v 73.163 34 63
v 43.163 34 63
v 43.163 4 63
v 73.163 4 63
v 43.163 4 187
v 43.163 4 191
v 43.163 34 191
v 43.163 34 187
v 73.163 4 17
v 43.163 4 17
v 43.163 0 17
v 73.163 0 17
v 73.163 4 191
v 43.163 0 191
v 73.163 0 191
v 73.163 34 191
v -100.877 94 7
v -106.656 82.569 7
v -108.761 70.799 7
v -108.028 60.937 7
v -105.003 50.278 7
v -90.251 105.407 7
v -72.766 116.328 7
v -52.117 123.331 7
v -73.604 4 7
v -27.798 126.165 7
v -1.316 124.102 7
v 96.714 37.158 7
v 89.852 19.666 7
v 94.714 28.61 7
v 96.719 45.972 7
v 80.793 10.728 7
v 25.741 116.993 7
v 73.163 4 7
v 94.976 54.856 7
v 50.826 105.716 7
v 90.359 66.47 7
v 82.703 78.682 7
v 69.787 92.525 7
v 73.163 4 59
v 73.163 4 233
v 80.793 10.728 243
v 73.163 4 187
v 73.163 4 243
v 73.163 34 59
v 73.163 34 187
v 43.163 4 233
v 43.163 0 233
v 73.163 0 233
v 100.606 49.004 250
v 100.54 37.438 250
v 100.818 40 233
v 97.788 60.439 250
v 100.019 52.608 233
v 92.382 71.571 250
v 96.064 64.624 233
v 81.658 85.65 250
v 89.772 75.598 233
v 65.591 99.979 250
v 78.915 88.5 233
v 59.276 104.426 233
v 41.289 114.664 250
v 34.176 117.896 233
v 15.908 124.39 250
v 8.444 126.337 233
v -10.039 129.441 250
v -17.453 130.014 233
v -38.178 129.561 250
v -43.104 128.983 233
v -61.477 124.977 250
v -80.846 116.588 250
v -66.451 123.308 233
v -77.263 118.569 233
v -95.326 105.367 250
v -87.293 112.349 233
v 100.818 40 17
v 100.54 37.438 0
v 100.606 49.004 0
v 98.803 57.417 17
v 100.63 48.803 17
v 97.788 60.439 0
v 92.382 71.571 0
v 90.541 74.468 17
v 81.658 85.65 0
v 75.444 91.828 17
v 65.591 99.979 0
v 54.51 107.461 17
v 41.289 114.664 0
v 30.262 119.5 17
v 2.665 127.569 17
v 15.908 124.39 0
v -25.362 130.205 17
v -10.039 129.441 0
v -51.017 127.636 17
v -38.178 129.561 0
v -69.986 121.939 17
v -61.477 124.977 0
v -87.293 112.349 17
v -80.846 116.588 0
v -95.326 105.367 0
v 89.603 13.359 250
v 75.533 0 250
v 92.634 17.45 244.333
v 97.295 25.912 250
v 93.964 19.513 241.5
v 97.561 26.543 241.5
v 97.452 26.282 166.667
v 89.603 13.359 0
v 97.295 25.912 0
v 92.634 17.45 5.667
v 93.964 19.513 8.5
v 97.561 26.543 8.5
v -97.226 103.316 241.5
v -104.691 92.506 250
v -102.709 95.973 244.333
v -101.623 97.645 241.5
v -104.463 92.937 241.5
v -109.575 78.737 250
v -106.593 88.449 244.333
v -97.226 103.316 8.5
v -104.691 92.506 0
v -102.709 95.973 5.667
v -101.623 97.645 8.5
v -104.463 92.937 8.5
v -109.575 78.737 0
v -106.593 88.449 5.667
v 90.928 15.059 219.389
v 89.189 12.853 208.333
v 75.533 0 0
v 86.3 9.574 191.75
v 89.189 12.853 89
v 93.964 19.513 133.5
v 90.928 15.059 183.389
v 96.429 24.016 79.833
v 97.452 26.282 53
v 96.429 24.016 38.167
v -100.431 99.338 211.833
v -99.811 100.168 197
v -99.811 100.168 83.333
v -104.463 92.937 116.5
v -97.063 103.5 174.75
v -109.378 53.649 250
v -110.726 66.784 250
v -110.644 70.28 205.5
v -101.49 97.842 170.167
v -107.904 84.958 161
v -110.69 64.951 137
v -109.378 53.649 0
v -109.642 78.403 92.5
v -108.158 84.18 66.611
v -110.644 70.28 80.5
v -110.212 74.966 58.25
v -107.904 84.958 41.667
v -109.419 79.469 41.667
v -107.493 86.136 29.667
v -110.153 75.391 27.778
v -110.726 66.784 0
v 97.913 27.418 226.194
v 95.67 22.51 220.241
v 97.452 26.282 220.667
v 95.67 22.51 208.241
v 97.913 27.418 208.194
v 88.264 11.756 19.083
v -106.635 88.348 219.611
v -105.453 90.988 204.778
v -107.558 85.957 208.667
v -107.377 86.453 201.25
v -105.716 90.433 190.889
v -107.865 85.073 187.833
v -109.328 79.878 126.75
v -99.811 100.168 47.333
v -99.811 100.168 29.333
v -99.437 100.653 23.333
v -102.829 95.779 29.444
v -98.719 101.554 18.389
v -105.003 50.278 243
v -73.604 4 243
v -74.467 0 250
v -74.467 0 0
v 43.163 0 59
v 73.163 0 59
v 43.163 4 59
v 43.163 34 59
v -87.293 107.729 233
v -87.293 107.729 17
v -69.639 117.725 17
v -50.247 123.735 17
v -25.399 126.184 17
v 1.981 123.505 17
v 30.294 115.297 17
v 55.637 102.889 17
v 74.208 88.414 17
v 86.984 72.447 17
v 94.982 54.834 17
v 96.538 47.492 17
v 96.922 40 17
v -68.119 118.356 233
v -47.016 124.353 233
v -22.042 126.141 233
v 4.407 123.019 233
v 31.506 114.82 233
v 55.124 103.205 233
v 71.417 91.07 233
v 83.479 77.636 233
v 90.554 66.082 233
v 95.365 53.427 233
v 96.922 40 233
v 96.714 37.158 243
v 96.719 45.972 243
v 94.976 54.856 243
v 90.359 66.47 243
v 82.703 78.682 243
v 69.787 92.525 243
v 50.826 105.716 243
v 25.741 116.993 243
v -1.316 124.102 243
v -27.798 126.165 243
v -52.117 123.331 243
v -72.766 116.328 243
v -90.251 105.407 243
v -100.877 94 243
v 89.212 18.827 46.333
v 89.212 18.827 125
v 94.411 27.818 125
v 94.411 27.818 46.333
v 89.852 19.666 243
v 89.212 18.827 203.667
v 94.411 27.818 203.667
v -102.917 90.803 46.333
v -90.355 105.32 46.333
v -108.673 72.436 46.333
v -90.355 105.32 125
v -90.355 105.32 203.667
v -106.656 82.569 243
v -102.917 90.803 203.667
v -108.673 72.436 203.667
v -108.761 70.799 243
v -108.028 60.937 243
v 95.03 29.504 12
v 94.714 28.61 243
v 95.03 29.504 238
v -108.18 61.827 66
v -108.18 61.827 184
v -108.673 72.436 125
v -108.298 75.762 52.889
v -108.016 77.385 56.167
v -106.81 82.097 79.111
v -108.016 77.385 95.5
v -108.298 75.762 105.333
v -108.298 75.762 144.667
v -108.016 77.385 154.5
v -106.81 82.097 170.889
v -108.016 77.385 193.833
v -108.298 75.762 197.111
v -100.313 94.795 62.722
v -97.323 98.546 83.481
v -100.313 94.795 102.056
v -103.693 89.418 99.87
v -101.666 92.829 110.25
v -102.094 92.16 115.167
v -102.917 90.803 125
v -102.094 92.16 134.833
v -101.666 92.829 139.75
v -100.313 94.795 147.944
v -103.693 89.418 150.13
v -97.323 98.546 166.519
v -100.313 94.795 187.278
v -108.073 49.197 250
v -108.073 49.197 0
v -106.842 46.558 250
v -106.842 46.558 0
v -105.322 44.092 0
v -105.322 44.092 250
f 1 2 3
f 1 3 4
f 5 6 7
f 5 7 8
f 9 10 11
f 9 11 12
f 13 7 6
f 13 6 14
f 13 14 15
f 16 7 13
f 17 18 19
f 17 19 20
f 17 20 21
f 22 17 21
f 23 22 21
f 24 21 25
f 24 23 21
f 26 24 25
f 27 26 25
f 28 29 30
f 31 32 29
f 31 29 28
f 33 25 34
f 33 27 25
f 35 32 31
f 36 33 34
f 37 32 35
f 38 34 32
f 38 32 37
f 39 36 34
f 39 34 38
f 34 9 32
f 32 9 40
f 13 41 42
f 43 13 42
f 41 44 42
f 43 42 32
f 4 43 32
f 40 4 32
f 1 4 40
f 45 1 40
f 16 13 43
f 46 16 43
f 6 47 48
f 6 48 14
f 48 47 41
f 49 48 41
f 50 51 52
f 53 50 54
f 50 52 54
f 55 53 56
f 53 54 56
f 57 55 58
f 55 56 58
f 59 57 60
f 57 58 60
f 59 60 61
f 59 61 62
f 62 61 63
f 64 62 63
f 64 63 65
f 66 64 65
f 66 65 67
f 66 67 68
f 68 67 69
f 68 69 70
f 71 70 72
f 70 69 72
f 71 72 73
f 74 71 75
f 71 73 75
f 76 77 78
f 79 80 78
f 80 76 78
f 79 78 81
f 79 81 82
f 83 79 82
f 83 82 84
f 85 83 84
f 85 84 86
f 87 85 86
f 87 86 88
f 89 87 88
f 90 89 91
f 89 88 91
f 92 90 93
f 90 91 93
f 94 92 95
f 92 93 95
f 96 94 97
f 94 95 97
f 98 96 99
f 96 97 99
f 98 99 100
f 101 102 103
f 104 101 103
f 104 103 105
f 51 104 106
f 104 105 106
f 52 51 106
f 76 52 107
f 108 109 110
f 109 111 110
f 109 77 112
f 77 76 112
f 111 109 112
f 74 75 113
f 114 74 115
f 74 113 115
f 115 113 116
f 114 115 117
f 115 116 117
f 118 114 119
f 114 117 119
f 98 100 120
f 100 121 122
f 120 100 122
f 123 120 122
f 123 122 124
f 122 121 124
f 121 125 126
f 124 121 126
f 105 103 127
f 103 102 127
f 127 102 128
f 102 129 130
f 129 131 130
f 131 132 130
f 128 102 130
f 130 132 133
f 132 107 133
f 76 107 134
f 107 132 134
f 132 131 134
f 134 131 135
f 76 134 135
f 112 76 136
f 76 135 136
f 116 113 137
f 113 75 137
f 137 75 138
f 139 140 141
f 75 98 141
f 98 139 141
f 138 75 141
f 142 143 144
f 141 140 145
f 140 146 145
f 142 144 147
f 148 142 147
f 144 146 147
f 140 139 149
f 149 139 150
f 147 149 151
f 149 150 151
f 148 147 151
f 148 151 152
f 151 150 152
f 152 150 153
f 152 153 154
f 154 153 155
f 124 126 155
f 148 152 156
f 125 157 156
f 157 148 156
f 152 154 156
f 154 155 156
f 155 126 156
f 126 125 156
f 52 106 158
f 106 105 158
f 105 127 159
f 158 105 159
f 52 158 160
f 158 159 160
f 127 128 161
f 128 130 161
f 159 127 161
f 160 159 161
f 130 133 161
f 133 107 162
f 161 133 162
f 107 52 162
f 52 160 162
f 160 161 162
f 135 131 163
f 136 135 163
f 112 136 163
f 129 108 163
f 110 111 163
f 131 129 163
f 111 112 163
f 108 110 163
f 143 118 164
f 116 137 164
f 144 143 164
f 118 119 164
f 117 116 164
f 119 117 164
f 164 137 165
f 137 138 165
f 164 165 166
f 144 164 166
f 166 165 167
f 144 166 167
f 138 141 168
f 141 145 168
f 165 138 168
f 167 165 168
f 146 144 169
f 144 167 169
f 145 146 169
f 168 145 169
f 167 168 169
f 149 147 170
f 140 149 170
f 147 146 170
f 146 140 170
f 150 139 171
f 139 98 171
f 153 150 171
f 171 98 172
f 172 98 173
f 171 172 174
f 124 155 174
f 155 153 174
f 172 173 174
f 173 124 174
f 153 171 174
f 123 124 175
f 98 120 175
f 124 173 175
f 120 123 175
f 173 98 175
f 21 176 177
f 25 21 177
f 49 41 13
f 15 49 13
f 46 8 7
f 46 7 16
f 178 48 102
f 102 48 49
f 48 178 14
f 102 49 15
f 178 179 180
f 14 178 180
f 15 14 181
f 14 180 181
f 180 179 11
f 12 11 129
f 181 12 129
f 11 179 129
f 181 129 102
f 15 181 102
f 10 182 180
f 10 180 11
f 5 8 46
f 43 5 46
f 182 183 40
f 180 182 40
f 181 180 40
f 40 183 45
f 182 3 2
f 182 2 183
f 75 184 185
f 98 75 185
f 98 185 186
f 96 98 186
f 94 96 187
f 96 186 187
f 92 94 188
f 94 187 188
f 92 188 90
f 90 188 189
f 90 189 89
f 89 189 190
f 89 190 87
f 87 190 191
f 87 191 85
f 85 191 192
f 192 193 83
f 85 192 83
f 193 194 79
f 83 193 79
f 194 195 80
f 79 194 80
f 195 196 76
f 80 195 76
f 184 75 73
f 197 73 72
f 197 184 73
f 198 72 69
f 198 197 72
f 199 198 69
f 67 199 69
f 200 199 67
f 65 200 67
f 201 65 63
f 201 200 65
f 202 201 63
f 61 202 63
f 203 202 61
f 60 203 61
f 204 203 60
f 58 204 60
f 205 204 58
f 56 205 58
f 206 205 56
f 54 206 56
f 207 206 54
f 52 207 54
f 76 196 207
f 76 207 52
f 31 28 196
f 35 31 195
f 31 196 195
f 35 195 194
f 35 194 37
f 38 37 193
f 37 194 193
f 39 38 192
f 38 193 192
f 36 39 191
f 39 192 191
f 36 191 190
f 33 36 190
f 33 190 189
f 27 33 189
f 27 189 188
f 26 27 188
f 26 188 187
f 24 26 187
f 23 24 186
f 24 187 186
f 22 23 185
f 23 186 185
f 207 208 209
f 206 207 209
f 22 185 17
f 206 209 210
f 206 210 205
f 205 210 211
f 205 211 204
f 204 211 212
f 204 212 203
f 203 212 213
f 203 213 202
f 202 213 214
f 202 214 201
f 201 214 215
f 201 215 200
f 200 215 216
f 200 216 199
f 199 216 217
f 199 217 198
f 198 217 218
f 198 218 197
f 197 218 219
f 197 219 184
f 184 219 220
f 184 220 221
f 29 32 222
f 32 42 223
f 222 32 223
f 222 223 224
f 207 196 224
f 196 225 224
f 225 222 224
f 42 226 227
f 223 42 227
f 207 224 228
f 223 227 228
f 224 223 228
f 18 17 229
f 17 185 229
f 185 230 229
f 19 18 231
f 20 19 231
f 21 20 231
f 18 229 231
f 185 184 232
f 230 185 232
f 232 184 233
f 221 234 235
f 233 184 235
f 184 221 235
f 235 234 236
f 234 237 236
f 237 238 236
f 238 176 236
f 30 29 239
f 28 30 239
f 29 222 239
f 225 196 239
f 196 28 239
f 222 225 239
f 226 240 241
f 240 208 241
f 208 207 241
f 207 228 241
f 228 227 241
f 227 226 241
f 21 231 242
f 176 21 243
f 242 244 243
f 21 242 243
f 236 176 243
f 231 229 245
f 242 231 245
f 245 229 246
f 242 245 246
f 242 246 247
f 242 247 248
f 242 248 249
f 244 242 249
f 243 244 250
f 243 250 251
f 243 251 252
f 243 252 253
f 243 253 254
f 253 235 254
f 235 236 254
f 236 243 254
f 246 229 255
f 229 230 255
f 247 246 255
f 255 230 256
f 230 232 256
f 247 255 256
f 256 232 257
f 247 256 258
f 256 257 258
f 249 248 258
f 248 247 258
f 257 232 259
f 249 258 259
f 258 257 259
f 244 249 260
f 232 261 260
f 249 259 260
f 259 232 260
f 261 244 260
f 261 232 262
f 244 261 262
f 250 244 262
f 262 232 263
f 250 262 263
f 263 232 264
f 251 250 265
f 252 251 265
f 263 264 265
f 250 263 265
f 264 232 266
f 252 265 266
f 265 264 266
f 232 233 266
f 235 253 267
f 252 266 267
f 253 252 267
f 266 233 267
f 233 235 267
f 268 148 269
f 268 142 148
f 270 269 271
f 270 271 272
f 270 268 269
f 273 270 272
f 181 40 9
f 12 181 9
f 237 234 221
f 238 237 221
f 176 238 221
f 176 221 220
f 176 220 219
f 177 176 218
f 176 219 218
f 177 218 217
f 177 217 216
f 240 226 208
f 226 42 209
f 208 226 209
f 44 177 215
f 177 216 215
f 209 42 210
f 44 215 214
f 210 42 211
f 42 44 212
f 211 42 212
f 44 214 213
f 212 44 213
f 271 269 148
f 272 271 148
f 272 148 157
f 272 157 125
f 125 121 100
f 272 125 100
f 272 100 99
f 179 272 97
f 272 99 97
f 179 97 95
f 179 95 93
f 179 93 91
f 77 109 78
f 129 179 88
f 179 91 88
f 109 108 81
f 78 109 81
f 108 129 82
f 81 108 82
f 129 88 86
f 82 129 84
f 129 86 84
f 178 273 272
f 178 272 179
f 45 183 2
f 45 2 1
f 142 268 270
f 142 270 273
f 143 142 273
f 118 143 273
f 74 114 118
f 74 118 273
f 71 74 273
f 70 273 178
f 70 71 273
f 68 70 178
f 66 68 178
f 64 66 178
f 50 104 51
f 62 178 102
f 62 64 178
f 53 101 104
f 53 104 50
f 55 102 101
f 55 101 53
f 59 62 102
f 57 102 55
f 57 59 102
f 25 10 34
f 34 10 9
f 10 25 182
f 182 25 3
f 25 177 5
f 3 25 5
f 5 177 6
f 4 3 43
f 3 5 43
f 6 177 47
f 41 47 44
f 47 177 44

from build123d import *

# Parameters (mm, degrees)
BOSS_EXTRUDE1_DEPTH     = 250
CUT_EXTRUDE1_START      = -7
CUT_EXTRUDE1_DEPTH      = 236
CUT_EXTRUDE2_START      = 40
SKETCH3_W               = 188.244995532
SKETCH3_H               = 216
CUT_EXTRUDE2_DEPTH      = 236
FILLET1_R               = 25
SKETCH6_W               = 30
SKETCH6_H               = 4
BOSS_EXTRUDE2_DEPTH     = 30
SKETCH7_W               = 30
SKETCH7_H               = 42
CUT_EXTRUDE3_DEPTH      = 127.205636965
CUT_EXTRUDE3_DEPTH_BACK = 5.0000001
SKETCH8_W               = 30
SKETCH8_H               = 4
BOSS_EXTRUDE3_DEPTH     = 30
SKETCH9_W               = 30
SKETCH9_H               = 42
CUT_EXTRUDE4_DEPTH      = 127.205636965
CUT_EXTRUDE4_DEPTH_BACK = 5.0000001


with BuildPart() as part:
    # Sketch1 → Boss-Extrude1 (new body)
    with BuildSketch(Plane.XY):
        with BuildLine():
            Line((-74.466852712, 0), (75.533147288, 0))
            add(Edge.make_bspline(
                [(75.533147288, 0), (138.063372934, 47.200510513), (16.470001542, 172.007803308), (-124.949591118, 111.301552399), (-108.081203548, 48.03596108)],
                knots=[0, 0, 0, 0, 0.526874503, 1, 1, 1, 1], degree=3))
            Line((-108.081203548, 48.03596108), (-74.466852712, 0))
        make_face()
    extrude(amount=BOSS_EXTRUDE1_DEPTH)

    # Sketch2 → Cut-Extrude1 (cut)
    with BuildSketch(Plane.XY.offset(250).offset(CUT_EXTRUDE1_START)):
        with BuildLine():
            Line((-105.002588912, 50.278247003), (-73.603513663, 4))
            Line((-73.603513663, 4), (73.163375947, 4))
            Line((73.163375947, 4), (80.793344513, 10.72835486))
            add(Edge.make_bspline(
                [(80.793344513, 10.72835486), (92.651817418, 19.563808902), (103.009839439, 45.205558115), (79.954027593, 88.91810325), (40.607899873, 112.95610518), (-11.204752472, 129.142722192), (-79.431682825, 124.667635826), (-117.344714605, 82.323825457), (-105.002588912, 50.278247003)],
                knots=[0.016278873, 0.016278873, 0.016278873, 0.016278873, 0.12675304, 0.268313114, 0.414746674, 0.542882576, 0.761532881, 1, 1, 1, 1], degree=3))
        make_face()
    extrude(amount=-CUT_EXTRUDE1_DEPTH, mode=Mode.SUBTRACT)

    # Sketch3 → Cut-Extrude2 (cut)
    with BuildSketch(Plane(origin=(0, 0, 0), x_dir=(1, 0, 0), z_dir=(0, 1, 0)).offset(CUT_EXTRUDE2_START)):
        with Locations((6.82953452, -125)):
            Rectangle(SKETCH3_W, SKETCH3_H)
    extrude(amount=CUT_EXTRUDE2_DEPTH, mode=Mode.SUBTRACT)

    # Fillet1
    fillet1_edges = [part.edges().sort_by_distance(p)[0] for p in [
        (-108.081203548, 48.03596108, 125),
    ]]
    fillet(fillet1_edges, radius=FILLET1_R)

    # Sketch6 → Boss-Extrude2 (add)
    with BuildSketch(Plane(origin=(0, 4, 0), x_dir=(1, 0, 0), z_dir=(0, 1, 0))):
        with Locations((58.163375947, -189)):
            Rectangle(SKETCH6_W, SKETCH6_H)
    extrude(amount=BOSS_EXTRUDE2_DEPTH)

    # Sketch7 → Cut-Extrude3 (cut, two sides)
    with BuildSketch(Plane(origin=(0, 4, 0), x_dir=(1, 0, 0), z_dir=(0, 1, 0))) as cut_extrude3_sk:
        with Locations((58.163375947, -212)):
            Rectangle(SKETCH7_W, SKETCH7_H)
    extrude(amount=CUT_EXTRUDE3_DEPTH, mode=Mode.SUBTRACT)
    extrude(cut_extrude3_sk.sketch, amount=-CUT_EXTRUDE3_DEPTH_BACK, mode=Mode.SUBTRACT)

    # Sketch8 → Boss-Extrude3 (add)
    with BuildSketch(Plane(origin=(0, 4, 0), x_dir=(1, 0, 0), z_dir=(0, 1, 0))):
        with Locations((58.163375947, -61)):
            Rectangle(SKETCH8_W, SKETCH8_H)
    extrude(amount=BOSS_EXTRUDE3_DEPTH)

    # Sketch9 → Cut-Extrude4 (cut, two sides)
    with BuildSketch(Plane(origin=(0, 4, 0), x_dir=(1, 0, 0), z_dir=(0, 1, 0))) as cut_extrude4_sk:
        with Locations((58.163375947, -38)):
            Rectangle(SKETCH9_W, SKETCH9_H)
    extrude(amount=CUT_EXTRUDE4_DEPTH, mode=Mode.SUBTRACT)
    extrude(cut_extrude4_sk.sketch, amount=-CUT_EXTRUDE4_DEPTH_BACK, mode=Mode.SUBTRACT)


solid = part.part
